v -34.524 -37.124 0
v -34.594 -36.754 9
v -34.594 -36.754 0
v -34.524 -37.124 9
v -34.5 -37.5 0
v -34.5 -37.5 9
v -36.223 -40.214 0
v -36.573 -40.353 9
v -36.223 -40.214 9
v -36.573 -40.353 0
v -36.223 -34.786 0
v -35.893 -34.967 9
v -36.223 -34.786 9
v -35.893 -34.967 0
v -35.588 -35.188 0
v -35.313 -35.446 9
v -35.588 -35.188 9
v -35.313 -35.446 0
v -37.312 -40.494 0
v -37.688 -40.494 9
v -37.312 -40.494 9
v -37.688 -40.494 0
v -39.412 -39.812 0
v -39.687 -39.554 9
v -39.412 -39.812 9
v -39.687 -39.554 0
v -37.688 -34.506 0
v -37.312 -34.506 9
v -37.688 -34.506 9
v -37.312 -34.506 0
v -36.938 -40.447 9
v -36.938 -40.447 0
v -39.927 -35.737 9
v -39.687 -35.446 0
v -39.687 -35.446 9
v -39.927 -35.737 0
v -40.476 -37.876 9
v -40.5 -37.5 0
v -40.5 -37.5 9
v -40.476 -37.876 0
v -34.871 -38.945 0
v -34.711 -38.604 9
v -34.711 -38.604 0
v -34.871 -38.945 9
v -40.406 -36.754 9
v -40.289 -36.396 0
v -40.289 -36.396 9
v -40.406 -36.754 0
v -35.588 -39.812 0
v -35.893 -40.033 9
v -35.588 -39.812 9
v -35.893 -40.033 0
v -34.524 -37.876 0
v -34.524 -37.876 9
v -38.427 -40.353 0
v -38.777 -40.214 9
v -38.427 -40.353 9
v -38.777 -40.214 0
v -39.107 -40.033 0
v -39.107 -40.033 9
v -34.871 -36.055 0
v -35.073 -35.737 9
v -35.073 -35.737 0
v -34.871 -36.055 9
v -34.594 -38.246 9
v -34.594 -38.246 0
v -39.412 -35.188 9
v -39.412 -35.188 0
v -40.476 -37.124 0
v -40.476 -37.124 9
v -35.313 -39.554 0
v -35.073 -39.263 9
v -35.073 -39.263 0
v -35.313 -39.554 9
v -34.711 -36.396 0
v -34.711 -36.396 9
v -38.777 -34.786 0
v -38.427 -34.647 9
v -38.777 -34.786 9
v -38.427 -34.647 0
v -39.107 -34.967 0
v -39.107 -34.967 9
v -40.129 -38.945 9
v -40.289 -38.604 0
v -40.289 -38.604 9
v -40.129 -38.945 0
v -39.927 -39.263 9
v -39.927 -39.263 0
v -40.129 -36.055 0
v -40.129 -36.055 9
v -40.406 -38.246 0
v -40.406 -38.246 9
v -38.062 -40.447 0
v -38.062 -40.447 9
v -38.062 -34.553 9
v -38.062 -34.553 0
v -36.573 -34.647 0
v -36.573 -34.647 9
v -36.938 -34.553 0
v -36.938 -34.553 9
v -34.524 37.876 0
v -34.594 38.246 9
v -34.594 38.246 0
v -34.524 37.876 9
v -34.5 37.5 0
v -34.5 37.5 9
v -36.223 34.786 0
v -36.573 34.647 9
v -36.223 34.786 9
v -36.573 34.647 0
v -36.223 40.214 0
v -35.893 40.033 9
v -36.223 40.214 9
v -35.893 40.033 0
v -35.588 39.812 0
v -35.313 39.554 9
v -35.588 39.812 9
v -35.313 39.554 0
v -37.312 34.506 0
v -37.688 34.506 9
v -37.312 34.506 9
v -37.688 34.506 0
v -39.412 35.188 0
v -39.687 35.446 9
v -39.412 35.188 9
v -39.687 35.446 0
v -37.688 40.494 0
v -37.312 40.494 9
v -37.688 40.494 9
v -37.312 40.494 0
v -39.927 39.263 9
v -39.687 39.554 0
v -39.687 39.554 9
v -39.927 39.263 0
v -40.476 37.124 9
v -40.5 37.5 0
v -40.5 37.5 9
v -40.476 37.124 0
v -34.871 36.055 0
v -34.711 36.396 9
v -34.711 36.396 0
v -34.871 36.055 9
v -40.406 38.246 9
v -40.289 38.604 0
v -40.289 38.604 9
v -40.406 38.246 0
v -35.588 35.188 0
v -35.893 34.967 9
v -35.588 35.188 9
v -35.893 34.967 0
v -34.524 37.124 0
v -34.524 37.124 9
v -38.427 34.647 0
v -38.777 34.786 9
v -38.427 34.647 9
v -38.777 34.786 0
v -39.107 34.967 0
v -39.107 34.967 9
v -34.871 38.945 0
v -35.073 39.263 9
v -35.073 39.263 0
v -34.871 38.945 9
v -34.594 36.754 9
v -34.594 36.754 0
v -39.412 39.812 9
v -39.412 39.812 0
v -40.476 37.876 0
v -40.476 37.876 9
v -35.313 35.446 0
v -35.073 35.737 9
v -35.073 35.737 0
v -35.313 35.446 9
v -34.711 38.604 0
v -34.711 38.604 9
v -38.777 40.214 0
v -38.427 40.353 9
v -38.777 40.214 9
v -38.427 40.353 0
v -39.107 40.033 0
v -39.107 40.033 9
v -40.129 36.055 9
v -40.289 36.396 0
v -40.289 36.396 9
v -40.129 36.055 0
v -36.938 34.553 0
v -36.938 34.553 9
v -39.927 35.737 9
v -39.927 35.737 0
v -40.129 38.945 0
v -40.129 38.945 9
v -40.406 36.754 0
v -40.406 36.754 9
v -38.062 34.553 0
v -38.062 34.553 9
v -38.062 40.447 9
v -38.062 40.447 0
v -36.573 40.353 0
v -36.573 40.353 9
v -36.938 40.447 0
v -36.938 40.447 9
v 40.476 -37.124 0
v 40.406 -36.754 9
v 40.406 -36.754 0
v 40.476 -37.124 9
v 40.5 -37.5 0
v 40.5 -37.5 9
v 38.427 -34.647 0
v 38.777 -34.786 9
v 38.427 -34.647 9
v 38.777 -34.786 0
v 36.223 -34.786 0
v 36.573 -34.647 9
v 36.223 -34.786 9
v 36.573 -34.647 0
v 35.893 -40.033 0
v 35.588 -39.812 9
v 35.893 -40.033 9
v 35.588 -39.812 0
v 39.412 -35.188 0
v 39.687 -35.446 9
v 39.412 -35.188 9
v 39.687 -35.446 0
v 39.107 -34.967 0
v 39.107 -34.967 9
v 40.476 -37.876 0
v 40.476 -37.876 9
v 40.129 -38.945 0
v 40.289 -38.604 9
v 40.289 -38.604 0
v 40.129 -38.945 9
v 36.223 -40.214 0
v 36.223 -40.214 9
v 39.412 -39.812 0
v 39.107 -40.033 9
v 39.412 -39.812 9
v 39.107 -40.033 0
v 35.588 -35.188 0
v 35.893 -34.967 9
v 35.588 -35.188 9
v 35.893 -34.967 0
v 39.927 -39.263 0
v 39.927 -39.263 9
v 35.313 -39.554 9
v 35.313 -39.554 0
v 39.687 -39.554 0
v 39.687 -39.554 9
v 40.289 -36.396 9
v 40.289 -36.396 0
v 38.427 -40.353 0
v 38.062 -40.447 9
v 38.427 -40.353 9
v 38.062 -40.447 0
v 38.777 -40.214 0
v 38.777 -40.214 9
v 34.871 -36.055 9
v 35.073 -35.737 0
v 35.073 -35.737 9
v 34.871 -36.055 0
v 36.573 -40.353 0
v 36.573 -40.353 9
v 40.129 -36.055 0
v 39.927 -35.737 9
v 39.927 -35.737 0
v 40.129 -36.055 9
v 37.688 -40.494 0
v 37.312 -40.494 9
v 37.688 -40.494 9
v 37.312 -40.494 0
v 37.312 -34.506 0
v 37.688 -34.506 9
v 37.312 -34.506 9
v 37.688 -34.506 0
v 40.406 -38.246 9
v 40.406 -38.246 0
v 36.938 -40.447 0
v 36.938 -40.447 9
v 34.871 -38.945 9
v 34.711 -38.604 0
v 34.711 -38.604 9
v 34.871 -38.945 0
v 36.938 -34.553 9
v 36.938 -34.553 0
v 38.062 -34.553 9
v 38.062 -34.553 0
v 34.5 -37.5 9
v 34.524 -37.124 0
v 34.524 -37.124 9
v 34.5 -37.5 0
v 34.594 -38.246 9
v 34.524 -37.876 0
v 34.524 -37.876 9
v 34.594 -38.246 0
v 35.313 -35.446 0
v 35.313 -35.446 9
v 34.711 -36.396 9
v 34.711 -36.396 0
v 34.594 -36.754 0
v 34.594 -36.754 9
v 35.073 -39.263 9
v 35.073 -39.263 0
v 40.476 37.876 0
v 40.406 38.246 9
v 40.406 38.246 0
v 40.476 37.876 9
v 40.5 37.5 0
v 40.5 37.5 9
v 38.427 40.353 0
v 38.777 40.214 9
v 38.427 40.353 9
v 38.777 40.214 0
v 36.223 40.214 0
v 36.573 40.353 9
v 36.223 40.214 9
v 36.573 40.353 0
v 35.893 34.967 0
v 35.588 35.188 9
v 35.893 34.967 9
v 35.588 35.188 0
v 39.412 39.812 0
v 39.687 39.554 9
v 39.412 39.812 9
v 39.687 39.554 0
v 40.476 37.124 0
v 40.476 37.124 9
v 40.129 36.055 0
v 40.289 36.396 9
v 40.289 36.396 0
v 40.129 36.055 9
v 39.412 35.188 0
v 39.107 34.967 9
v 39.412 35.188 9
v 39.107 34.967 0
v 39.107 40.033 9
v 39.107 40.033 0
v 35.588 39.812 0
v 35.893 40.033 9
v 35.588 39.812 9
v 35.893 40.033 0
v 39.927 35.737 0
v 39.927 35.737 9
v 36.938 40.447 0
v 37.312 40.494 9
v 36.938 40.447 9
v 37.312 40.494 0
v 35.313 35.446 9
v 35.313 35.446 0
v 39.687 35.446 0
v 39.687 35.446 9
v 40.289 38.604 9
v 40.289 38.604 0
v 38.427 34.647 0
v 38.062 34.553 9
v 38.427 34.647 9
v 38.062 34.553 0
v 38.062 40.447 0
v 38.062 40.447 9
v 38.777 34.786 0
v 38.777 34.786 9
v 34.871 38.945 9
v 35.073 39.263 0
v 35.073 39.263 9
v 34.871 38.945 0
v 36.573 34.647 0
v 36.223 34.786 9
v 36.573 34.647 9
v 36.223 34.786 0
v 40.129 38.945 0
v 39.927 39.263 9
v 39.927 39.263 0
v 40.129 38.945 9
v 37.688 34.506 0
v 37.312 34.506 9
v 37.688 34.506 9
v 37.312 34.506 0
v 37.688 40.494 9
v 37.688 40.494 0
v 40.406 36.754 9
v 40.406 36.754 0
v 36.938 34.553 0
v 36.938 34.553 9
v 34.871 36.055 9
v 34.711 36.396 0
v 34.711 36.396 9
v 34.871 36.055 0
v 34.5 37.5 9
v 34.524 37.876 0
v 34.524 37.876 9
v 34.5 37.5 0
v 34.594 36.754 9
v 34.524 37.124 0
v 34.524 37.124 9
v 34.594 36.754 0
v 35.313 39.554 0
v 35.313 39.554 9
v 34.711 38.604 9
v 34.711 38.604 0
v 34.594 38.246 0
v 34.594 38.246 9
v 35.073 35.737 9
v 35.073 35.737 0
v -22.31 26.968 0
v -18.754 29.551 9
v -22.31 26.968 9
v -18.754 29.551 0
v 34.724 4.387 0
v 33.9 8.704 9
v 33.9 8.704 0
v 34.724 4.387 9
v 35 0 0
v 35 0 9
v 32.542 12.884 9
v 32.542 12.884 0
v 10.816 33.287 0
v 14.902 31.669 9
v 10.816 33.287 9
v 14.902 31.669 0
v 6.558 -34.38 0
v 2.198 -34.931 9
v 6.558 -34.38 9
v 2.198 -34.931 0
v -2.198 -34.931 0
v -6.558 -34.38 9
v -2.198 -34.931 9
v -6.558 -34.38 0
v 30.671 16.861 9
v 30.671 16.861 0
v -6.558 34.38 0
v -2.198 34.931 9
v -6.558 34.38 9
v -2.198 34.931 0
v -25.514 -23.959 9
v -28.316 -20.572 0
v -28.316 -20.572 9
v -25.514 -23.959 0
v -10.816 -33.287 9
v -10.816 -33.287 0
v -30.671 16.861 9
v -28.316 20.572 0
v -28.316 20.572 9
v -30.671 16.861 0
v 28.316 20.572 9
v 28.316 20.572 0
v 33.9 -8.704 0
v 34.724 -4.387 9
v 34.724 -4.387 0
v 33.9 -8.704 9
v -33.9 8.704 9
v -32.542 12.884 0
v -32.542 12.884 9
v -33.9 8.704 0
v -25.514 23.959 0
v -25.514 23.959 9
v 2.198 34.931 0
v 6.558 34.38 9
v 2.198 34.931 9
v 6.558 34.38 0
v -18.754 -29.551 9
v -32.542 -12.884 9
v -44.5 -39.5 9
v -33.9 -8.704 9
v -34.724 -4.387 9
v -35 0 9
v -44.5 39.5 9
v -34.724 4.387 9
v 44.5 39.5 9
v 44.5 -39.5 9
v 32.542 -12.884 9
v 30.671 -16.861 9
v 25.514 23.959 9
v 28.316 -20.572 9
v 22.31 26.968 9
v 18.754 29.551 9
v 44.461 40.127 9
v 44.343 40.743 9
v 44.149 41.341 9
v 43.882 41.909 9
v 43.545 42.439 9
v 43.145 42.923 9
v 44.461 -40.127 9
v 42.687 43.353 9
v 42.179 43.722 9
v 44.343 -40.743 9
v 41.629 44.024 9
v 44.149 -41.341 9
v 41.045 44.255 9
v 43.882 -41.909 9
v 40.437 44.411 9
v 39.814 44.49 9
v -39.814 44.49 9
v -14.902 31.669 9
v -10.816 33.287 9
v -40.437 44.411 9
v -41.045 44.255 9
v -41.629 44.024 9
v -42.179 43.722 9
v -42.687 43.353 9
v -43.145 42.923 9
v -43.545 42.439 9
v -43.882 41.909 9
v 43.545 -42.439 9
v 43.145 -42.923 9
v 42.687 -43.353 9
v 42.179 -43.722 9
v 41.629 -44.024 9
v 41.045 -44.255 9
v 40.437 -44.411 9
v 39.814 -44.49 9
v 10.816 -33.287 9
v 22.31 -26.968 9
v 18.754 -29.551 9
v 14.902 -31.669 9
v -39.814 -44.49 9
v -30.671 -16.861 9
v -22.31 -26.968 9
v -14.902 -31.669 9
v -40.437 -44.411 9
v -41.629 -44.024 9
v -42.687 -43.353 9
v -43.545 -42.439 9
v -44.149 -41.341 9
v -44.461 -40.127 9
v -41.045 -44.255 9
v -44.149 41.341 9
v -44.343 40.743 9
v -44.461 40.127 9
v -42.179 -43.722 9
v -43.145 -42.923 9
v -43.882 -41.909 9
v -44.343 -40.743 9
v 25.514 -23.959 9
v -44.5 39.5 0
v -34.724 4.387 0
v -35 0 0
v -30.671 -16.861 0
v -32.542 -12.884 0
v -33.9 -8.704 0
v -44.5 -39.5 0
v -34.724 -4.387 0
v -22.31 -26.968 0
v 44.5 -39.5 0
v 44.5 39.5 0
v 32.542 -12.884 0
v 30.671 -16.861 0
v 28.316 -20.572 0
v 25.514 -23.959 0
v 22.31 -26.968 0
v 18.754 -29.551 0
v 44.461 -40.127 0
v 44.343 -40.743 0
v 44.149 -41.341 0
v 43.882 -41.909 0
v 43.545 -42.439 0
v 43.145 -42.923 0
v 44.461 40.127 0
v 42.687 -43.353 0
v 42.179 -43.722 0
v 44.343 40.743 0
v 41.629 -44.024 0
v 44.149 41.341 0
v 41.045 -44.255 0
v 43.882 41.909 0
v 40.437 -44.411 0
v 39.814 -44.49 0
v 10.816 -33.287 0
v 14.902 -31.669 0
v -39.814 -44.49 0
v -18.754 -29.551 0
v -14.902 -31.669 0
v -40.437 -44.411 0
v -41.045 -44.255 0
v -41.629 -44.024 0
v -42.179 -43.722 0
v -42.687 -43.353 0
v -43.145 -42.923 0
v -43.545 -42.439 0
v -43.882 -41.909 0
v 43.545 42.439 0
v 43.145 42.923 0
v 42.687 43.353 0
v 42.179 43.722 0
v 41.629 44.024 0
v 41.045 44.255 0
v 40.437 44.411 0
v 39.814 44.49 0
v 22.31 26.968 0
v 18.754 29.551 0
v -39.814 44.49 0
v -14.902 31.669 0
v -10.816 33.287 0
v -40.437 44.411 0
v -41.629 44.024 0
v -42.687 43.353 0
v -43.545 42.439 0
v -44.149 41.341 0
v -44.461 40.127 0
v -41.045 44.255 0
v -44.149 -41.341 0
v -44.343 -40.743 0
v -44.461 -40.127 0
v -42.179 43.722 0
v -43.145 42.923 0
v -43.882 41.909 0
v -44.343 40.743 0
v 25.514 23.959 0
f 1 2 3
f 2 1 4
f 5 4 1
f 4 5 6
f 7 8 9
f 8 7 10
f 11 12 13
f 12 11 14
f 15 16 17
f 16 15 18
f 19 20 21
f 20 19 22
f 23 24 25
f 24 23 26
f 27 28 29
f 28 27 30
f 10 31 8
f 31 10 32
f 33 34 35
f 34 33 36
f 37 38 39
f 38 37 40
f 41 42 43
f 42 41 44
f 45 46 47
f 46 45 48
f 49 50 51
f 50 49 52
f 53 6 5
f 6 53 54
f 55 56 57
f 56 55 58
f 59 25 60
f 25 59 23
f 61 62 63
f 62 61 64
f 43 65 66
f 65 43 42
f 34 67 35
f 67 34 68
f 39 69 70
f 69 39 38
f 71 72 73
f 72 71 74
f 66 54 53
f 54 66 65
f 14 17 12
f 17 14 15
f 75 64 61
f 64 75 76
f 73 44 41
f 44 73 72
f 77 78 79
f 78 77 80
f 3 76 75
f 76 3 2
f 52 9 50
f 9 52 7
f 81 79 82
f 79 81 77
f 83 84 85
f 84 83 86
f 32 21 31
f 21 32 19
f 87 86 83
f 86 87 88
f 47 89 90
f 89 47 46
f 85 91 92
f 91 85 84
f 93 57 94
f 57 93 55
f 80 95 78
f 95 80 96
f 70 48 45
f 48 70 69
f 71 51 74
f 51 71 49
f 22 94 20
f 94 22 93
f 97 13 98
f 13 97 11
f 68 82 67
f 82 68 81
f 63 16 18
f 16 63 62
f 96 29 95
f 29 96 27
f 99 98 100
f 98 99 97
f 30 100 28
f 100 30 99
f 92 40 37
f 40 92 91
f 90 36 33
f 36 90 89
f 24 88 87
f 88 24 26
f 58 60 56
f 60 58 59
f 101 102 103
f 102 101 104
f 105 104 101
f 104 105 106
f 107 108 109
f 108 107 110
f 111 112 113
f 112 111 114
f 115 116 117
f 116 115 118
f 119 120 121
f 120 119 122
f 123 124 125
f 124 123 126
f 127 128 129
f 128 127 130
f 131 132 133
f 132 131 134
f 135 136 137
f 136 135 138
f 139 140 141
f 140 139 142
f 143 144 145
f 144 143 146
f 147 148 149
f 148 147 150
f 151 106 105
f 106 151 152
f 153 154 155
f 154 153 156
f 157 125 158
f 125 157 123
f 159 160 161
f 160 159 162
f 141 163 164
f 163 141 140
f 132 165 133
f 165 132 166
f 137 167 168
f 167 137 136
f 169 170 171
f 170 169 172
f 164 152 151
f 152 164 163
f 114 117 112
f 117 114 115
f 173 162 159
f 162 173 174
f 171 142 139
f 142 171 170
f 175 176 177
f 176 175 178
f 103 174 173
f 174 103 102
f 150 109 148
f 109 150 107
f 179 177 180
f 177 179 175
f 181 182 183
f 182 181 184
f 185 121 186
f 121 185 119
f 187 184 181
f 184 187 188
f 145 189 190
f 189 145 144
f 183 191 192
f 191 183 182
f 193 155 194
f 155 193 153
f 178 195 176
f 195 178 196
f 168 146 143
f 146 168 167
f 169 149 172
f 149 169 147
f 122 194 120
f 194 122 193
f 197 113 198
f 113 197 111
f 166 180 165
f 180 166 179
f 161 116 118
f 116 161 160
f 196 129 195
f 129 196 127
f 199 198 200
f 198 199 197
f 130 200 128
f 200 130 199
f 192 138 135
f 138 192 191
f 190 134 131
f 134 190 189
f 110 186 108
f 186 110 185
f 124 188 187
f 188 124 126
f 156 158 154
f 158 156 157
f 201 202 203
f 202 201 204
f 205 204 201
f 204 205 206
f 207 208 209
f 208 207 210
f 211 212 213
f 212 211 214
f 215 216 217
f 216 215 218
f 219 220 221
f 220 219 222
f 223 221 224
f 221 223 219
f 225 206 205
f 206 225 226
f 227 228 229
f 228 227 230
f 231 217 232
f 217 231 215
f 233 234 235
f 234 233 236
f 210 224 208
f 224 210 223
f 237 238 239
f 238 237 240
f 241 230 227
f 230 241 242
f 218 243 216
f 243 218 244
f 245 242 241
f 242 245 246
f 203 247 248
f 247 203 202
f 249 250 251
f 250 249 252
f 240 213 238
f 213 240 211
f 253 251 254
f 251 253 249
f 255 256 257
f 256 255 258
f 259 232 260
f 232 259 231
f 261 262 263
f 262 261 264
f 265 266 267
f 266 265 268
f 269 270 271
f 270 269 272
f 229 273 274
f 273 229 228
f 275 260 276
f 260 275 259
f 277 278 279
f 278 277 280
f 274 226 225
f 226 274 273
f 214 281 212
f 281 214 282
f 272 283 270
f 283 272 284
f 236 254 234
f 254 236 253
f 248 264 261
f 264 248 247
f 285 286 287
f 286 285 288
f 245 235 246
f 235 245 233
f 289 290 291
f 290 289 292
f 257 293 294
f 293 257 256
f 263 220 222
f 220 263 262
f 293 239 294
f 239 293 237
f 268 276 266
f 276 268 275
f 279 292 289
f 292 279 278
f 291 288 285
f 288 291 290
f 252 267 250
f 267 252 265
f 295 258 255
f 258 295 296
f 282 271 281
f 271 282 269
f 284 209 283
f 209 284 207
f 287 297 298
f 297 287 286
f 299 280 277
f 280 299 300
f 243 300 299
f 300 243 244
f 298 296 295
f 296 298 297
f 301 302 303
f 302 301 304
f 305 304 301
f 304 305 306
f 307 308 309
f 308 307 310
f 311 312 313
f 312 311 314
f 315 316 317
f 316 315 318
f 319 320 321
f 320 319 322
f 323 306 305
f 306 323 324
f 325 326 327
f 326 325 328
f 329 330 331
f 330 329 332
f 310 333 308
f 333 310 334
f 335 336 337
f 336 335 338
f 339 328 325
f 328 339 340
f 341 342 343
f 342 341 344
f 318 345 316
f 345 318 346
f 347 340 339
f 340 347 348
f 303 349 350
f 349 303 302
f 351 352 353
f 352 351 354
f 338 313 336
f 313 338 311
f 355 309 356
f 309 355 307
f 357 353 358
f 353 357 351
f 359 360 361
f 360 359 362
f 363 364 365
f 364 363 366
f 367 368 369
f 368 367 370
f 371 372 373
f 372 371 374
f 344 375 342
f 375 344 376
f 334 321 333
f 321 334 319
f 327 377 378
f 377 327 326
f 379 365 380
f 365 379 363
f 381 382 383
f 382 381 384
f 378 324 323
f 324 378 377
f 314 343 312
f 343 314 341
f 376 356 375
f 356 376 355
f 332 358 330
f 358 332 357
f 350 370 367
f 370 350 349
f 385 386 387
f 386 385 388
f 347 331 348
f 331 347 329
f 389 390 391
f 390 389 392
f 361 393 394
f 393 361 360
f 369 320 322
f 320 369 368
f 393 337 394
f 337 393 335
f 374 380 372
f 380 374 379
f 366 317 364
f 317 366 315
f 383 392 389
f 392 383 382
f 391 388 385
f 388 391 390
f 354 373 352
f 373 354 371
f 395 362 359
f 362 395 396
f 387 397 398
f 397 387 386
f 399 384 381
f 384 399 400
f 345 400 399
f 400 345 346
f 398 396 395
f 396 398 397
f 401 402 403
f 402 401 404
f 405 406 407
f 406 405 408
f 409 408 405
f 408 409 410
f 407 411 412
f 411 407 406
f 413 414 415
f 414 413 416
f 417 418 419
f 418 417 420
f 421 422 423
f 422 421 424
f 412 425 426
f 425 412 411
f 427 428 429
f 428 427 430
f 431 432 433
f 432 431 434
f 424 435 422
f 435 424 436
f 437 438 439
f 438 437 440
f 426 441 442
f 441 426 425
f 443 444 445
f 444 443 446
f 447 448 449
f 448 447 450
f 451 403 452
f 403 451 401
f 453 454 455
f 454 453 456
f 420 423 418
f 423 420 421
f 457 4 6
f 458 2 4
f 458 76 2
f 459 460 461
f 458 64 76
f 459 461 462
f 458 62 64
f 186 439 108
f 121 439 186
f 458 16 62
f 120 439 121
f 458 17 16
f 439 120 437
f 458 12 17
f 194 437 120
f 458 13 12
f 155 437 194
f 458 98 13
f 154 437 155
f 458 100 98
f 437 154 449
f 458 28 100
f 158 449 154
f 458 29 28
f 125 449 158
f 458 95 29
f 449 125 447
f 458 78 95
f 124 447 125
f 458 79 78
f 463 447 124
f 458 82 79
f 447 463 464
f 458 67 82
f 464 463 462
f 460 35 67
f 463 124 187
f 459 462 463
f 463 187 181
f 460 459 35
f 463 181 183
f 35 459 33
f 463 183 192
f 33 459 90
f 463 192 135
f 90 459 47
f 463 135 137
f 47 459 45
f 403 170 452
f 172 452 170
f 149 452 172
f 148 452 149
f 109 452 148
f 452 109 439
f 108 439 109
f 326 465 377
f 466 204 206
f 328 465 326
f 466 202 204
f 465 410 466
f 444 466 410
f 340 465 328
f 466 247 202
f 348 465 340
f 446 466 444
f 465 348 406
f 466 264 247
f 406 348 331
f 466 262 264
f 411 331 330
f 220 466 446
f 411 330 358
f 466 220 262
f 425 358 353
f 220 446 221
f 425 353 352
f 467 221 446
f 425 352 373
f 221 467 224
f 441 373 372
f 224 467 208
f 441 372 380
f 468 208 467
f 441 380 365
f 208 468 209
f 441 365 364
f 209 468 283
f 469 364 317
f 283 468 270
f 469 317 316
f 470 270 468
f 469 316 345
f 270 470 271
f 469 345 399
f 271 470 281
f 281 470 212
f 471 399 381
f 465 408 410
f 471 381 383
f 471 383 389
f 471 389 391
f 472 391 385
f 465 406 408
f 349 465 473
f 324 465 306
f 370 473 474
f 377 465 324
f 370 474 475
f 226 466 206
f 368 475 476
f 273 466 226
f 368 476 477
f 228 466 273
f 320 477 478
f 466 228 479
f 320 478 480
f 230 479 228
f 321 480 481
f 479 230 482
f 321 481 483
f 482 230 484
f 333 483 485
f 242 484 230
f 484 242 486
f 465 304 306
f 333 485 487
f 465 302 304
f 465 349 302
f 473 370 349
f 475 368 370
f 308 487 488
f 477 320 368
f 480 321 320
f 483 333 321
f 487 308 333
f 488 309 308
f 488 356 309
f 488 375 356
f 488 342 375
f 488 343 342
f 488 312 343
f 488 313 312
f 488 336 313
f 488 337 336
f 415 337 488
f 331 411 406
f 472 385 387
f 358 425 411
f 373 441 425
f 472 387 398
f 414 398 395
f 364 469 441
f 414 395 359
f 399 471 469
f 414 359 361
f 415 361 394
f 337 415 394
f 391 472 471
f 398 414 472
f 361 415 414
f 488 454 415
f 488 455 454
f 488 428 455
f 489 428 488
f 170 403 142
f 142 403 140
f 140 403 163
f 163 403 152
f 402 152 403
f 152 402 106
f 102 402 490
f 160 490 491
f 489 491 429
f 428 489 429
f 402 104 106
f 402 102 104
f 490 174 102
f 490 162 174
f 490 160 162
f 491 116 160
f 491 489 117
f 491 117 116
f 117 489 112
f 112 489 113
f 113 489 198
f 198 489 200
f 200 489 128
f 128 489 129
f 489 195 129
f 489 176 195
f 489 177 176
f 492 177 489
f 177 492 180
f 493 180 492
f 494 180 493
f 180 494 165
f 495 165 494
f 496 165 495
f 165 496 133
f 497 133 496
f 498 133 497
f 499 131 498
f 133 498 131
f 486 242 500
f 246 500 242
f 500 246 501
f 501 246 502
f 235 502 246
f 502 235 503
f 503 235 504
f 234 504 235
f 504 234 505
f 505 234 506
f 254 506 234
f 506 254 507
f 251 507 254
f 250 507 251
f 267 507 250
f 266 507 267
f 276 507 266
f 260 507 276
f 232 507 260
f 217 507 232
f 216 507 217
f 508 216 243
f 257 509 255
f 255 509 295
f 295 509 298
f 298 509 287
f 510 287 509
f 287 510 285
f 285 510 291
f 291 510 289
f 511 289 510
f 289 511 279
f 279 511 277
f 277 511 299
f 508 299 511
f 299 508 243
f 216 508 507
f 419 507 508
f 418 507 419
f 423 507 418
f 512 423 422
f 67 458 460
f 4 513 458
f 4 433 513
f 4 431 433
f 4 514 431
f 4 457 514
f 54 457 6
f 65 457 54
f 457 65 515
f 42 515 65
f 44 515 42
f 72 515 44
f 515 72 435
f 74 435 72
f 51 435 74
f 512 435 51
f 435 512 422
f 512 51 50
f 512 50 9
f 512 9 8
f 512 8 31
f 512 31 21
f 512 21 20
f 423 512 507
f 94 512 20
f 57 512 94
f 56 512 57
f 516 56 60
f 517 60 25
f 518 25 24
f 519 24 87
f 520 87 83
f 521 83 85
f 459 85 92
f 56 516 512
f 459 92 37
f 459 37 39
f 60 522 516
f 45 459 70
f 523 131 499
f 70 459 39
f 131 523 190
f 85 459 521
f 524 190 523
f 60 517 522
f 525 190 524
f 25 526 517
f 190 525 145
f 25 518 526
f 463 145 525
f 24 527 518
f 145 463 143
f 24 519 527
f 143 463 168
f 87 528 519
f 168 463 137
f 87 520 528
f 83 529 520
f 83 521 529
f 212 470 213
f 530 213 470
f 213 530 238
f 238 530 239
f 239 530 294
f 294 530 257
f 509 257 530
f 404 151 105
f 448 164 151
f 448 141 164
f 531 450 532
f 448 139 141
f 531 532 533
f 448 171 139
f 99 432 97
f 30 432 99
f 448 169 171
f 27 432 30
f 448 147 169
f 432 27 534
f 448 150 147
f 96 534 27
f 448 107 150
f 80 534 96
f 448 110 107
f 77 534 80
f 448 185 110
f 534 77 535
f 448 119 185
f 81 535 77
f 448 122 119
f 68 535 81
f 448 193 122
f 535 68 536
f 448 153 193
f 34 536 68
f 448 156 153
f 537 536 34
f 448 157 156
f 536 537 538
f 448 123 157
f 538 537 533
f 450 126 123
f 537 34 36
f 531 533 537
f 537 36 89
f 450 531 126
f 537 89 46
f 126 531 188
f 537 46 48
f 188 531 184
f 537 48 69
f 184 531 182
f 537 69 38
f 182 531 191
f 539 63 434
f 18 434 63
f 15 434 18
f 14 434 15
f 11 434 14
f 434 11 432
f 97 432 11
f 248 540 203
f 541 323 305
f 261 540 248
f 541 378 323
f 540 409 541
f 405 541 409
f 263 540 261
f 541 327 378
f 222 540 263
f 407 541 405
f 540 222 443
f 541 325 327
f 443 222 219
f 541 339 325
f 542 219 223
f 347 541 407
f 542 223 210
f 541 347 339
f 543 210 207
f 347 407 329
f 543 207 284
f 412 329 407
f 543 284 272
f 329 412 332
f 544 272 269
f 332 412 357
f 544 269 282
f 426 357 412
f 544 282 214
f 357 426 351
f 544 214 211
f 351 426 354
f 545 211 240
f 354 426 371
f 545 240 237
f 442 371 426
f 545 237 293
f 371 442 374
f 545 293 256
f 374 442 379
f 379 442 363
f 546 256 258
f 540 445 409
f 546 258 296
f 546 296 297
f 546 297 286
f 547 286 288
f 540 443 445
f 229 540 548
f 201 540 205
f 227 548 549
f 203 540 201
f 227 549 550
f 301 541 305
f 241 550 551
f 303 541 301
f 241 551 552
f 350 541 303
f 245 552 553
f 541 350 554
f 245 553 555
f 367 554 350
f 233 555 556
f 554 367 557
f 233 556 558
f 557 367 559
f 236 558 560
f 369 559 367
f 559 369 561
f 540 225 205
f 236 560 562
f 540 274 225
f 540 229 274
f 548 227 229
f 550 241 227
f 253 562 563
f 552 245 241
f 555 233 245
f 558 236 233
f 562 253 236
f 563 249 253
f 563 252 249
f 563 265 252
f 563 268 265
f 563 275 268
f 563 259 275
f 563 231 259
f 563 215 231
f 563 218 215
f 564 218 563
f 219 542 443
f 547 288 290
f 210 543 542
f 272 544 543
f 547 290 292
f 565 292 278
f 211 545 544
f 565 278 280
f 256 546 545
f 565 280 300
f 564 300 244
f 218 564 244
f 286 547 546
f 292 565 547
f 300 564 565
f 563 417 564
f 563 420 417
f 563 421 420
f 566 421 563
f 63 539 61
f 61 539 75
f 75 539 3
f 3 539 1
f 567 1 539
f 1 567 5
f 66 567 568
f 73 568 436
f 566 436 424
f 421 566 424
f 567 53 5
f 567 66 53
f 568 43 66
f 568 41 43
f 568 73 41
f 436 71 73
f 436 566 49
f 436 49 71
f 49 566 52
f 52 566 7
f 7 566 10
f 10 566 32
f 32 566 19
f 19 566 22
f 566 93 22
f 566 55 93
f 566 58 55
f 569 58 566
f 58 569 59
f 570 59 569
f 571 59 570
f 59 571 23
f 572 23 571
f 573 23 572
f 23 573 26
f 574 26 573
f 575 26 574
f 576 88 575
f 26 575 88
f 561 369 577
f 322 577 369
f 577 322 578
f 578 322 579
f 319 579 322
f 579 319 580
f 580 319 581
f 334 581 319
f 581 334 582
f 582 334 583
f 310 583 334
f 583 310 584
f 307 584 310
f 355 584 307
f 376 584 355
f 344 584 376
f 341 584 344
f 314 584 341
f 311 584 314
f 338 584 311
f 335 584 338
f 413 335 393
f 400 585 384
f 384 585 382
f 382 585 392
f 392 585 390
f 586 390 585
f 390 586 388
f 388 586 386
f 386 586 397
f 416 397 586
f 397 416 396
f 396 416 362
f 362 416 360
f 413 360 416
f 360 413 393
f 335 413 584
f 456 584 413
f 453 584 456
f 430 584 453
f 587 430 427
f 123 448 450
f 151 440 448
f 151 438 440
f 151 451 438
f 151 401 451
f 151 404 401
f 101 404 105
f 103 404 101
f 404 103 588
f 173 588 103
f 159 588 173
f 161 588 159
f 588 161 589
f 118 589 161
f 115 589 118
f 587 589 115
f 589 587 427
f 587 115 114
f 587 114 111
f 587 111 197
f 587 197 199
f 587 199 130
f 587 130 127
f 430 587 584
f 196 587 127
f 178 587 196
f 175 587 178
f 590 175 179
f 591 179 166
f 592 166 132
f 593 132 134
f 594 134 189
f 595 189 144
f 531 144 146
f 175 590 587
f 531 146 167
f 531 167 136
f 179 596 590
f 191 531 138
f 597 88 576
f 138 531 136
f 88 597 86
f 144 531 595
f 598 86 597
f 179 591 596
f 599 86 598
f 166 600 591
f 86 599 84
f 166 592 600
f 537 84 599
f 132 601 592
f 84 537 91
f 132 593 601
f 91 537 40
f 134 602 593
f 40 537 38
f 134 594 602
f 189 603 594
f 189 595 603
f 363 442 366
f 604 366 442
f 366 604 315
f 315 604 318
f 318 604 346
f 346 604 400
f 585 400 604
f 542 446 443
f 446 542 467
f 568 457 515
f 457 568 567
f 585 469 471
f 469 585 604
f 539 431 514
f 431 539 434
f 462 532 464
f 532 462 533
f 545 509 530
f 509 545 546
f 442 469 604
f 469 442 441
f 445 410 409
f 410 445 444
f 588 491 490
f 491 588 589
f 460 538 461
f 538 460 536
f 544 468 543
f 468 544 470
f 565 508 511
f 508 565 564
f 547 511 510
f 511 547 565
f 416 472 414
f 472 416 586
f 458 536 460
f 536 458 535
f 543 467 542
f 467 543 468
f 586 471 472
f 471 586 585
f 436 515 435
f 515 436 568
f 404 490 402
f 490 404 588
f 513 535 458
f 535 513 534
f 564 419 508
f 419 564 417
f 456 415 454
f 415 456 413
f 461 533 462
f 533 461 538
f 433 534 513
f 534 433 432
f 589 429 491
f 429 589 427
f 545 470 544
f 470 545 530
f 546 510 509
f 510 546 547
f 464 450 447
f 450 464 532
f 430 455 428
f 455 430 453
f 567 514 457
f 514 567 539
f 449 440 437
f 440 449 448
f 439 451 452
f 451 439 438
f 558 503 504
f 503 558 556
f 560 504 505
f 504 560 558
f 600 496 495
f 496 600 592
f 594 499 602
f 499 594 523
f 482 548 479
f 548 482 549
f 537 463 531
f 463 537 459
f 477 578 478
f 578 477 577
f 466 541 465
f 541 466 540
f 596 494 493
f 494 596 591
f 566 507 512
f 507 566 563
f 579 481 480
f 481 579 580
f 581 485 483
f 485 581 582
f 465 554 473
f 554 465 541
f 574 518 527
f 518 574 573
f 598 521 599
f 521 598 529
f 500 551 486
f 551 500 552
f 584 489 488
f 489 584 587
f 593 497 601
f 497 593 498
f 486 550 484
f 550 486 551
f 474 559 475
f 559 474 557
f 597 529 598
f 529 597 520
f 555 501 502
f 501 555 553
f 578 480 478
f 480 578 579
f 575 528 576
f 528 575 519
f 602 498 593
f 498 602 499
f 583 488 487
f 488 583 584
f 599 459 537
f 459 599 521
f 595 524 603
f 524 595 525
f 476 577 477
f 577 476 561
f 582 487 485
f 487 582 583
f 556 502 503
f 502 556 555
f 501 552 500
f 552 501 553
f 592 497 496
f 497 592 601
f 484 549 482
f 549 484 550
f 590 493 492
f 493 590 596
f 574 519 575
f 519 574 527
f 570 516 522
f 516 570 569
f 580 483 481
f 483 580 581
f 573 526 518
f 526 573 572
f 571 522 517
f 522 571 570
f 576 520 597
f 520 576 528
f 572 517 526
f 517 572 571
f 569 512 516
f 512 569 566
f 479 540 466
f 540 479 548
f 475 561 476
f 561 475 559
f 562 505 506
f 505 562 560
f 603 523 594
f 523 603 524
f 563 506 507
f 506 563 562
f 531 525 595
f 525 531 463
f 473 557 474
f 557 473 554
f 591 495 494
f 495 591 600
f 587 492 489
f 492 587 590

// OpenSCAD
$fn = 50;


difference() {
	union() {
		hull() {
			translate(v = [-39.5000000000, 39.5000000000, 0]) {
				cylinder(h = 9, r = 5);
			}
			translate(v = [39.5000000000, 39.5000000000, 0]) {
				cylinder(h = 9, r = 5);
			}
			translate(v = [-39.5000000000, -39.5000000000, 0]) {
				cylinder(h = 9, r = 5);
			}
			translate(v = [39.5000000000, -39.5000000000, 0]) {
				cylinder(h = 9, r = 5);
			}
		}
	}
	union() {
		#translate(v = [-37.5000000000, -37.5000000000, -100.0000000000]) {
			cylinder(h = 200, r = 3.0000000000);
		}
		#translate(v = [-37.5000000000, 37.5000000000, -100.0000000000]) {
			cylinder(h = 200, r = 3.0000000000);
		}
		#translate(v = [37.5000000000, -37.5000000000, -100.0000000000]) {
			cylinder(h = 200, r = 3.0000000000);
		}
		#translate(v = [37.5000000000, 37.5000000000, -100.0000000000]) {
			cylinder(h = 200, r = 3.0000000000);
		}
		#cylinder(h = 9, r = 35.0000000000);
	}
}
